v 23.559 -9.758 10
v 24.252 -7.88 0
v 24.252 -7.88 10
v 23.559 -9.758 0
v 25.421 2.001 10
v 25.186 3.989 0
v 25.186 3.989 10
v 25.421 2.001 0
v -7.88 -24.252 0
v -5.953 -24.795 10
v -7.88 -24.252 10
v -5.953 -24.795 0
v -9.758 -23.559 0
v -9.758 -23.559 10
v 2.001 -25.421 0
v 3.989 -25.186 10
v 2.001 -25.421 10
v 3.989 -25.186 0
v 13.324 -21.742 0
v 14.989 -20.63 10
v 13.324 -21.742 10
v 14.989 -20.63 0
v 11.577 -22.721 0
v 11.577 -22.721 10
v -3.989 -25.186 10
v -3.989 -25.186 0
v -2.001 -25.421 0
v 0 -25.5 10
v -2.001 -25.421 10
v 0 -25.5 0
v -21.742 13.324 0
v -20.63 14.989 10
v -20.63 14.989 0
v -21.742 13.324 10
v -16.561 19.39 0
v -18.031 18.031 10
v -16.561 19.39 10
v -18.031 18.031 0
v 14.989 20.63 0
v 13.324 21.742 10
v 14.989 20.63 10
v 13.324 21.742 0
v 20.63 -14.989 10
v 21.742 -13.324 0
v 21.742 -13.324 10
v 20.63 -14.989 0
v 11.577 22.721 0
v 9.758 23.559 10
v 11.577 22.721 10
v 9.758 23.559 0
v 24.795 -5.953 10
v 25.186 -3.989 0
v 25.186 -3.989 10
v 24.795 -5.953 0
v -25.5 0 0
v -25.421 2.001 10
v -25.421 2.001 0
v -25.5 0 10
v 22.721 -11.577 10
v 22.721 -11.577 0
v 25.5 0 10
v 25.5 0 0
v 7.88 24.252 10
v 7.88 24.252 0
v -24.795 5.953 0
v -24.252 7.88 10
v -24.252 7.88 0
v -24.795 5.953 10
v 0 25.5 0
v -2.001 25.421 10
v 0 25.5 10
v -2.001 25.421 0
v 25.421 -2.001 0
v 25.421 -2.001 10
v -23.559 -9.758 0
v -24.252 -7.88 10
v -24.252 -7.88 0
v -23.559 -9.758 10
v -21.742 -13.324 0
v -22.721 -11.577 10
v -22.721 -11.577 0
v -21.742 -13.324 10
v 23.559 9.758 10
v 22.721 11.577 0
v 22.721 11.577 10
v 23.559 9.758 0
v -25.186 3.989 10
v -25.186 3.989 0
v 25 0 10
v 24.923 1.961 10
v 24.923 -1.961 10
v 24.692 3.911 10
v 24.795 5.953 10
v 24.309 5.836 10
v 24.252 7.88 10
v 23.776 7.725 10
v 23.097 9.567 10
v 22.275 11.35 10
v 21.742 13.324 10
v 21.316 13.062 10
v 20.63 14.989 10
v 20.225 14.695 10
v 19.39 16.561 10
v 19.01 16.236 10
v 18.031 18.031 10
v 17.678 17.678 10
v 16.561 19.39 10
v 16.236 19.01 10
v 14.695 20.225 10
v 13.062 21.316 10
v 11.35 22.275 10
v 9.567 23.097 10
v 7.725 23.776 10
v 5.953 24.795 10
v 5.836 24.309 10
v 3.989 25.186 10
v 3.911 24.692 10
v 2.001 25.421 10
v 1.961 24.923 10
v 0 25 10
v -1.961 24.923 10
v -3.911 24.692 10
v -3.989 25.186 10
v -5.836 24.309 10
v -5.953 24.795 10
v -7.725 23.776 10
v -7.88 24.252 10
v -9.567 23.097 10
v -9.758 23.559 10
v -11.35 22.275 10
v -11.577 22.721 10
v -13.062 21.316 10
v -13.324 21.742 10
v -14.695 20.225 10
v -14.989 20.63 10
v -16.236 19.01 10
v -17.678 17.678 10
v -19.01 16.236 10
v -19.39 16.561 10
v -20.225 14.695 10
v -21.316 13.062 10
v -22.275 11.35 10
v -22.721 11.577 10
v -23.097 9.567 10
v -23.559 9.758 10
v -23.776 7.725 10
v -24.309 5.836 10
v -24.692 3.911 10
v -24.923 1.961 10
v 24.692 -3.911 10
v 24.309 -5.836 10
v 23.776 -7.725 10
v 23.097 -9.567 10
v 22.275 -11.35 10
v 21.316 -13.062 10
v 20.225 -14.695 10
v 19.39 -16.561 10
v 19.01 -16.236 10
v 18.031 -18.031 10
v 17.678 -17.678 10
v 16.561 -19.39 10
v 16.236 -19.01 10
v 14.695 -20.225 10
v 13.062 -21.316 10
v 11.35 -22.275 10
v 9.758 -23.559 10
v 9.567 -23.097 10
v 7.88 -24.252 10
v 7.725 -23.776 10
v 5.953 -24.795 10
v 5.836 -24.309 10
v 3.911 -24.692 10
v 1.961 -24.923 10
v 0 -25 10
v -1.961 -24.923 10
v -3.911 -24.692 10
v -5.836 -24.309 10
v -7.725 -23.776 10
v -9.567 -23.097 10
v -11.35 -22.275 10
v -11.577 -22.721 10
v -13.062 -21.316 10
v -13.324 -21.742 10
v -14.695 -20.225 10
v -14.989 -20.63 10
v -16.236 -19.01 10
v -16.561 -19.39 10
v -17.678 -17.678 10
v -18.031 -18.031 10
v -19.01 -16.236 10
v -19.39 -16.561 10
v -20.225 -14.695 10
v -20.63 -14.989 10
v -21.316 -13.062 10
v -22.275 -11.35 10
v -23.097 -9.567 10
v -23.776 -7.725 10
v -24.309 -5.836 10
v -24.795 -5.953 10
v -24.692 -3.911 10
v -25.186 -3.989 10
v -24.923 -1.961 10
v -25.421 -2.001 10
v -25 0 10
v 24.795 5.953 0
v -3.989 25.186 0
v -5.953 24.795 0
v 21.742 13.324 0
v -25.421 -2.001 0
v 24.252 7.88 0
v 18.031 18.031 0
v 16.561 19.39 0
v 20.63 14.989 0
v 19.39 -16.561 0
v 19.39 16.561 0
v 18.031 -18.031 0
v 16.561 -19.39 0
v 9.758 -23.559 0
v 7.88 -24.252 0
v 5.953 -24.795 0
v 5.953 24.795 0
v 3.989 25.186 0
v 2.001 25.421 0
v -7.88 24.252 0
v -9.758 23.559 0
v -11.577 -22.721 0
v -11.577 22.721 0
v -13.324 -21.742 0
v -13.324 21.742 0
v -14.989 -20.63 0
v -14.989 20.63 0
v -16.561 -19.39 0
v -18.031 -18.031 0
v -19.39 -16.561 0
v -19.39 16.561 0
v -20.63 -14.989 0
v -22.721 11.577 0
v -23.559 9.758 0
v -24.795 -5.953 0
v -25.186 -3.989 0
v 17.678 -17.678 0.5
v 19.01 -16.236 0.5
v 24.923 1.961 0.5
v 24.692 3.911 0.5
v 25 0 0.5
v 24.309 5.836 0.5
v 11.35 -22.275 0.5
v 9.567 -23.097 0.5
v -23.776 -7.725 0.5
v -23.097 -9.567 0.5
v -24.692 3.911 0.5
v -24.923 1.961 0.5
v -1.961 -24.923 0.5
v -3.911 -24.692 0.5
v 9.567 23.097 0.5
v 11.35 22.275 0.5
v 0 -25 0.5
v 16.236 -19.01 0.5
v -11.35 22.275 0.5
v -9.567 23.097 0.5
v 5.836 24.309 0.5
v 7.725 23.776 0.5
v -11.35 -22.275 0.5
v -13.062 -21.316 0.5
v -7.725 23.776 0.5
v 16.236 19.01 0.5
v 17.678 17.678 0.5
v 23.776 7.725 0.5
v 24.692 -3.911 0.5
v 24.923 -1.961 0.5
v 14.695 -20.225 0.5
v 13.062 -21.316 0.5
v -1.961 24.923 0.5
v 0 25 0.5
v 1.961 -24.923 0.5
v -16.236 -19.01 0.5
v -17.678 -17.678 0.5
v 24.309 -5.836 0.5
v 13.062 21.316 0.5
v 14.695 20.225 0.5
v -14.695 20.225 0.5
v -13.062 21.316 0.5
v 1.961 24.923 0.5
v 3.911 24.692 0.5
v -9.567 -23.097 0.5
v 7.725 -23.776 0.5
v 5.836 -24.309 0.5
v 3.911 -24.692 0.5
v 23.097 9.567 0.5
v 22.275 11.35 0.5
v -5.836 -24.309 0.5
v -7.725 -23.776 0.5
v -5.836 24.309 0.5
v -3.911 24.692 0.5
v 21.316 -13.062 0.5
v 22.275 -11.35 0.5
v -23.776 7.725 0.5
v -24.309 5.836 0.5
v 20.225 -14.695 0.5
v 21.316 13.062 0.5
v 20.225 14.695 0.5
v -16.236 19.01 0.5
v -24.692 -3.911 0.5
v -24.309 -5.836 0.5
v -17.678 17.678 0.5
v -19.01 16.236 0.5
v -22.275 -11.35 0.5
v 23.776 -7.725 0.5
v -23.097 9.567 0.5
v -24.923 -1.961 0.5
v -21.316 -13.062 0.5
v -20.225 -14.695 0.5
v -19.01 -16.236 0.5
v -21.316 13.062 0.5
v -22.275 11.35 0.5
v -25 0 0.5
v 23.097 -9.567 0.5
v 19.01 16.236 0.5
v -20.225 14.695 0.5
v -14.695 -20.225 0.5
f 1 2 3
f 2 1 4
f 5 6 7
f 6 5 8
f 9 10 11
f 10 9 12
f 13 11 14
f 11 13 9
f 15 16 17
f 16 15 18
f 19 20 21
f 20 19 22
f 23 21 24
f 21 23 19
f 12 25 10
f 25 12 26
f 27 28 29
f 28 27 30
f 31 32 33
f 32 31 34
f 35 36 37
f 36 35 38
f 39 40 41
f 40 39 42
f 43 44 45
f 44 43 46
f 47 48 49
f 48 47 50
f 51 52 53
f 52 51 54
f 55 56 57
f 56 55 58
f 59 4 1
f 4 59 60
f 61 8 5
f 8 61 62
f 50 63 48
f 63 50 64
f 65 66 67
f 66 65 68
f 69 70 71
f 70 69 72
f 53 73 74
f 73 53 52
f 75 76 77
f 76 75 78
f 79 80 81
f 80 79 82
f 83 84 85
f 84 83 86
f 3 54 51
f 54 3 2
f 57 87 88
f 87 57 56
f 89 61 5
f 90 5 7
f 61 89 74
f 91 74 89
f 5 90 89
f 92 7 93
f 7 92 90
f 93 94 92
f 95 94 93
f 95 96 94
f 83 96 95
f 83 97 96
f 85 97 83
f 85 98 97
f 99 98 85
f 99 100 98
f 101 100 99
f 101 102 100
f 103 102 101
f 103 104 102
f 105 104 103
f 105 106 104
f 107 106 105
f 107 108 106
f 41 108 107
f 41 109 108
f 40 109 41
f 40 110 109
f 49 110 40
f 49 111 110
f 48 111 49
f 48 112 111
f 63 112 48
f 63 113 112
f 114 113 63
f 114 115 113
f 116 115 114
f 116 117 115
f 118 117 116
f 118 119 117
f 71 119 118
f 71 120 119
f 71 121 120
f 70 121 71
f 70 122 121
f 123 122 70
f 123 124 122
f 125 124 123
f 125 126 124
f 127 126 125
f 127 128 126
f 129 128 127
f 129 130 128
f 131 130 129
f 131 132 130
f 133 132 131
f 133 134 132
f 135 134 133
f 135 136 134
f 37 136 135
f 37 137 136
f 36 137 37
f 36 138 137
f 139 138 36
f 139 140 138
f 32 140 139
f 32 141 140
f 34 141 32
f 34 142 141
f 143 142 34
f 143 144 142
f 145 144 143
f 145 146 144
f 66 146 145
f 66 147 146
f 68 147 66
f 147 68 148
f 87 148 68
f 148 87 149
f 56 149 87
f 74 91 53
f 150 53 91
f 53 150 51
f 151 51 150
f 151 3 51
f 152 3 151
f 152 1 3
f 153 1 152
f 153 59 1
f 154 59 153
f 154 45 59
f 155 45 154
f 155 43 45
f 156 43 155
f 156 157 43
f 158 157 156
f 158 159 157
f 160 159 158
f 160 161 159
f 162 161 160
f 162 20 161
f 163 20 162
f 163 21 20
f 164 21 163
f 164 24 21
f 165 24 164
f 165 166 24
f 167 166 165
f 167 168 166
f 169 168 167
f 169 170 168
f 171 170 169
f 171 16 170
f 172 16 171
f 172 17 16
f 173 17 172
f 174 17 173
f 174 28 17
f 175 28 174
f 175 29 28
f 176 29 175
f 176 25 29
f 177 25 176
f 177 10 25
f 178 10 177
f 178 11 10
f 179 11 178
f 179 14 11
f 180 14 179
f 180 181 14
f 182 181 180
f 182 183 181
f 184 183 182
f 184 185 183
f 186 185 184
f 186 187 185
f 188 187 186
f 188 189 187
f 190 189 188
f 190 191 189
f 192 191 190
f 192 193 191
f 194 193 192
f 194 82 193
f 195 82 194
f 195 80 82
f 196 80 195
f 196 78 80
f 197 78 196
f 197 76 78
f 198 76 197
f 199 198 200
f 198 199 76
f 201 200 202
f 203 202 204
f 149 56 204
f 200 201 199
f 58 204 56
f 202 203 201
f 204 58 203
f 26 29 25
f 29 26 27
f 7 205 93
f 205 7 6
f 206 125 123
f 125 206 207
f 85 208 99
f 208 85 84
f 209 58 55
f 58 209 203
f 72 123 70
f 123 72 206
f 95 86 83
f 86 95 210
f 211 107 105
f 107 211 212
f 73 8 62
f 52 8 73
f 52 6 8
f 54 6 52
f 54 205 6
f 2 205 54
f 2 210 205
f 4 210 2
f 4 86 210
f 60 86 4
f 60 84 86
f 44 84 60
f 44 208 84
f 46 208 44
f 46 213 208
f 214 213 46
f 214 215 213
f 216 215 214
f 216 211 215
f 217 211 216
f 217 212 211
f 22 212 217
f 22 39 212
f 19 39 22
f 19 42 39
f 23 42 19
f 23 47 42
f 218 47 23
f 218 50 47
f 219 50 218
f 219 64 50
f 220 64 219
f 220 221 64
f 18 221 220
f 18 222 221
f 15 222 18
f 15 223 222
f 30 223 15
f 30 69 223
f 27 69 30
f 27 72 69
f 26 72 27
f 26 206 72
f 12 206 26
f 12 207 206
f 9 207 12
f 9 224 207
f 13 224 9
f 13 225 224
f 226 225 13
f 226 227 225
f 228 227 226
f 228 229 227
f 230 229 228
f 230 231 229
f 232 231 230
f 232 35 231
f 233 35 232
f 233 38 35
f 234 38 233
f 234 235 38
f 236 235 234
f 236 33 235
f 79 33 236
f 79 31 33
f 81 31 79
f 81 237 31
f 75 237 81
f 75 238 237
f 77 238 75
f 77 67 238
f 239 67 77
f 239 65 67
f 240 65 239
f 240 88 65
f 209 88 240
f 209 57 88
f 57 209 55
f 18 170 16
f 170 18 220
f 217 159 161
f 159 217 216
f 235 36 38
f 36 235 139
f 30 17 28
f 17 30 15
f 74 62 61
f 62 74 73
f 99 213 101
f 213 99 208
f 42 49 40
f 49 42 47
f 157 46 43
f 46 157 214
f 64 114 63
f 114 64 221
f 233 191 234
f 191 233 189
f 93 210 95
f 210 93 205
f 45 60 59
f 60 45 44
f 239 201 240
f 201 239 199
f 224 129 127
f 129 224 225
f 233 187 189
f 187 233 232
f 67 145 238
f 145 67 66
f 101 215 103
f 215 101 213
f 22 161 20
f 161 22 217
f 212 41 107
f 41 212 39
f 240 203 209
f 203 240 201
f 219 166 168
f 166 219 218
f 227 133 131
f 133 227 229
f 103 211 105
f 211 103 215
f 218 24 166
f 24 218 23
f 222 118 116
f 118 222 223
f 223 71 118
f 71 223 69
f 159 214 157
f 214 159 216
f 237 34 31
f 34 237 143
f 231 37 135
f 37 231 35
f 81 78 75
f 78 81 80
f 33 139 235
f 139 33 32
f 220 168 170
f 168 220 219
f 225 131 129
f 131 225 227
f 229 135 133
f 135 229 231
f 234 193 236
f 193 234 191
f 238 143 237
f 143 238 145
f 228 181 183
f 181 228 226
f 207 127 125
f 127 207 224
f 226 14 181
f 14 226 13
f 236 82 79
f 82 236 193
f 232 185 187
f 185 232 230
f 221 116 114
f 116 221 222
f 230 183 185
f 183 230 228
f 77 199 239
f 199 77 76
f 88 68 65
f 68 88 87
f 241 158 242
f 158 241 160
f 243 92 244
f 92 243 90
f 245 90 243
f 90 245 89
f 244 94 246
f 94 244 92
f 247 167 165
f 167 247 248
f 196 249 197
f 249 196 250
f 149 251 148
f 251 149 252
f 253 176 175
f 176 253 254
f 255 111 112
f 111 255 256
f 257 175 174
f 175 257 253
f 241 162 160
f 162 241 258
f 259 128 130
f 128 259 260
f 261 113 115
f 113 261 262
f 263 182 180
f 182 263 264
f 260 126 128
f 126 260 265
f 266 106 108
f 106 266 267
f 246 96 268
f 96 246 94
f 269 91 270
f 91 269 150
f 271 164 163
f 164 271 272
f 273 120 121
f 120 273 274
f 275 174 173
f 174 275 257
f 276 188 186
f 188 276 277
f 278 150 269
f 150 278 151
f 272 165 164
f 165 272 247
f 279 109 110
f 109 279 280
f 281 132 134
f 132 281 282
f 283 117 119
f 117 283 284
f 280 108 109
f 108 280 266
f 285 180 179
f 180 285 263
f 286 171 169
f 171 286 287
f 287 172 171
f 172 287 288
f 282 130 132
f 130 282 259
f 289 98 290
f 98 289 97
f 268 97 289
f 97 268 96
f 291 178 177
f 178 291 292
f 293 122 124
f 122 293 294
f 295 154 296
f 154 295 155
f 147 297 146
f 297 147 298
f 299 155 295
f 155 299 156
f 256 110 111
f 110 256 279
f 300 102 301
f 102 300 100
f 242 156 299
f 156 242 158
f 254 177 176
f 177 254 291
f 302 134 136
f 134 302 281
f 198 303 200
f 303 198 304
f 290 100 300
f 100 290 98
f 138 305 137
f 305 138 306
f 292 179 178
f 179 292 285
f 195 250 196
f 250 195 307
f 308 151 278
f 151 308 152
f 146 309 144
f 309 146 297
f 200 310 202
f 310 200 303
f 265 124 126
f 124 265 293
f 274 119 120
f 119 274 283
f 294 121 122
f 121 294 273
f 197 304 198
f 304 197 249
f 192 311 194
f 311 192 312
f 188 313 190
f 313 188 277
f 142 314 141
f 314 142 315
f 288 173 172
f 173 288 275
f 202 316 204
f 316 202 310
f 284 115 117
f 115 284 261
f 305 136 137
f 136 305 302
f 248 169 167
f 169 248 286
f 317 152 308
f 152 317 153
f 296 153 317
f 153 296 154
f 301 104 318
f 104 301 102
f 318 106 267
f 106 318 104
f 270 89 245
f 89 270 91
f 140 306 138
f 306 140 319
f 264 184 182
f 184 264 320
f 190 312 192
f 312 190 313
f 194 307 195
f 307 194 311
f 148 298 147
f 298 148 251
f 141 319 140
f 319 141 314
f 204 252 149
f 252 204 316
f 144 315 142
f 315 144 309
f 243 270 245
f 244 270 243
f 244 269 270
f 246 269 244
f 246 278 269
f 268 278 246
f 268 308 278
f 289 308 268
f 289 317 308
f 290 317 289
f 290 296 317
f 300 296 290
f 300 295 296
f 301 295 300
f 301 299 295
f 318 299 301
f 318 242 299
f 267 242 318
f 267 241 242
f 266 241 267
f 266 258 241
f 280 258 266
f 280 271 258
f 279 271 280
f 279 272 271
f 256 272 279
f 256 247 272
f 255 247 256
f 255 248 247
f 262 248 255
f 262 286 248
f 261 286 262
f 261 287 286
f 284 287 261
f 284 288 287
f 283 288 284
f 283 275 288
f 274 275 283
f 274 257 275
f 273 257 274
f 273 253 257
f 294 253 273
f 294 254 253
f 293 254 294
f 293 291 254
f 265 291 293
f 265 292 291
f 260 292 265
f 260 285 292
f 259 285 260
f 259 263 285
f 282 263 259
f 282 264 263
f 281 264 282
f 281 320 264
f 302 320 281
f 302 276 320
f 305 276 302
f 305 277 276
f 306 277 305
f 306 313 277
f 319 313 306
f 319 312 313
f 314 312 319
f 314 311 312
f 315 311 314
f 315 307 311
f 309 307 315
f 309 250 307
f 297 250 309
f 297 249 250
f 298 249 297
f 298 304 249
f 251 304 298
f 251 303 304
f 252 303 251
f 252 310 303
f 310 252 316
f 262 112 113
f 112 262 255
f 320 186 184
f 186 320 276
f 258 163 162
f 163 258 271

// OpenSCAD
//!OpenSCAD
// Customizable tube cap

// Resolution
$fn = 80;
cap_inside_diameter = 50;
wall_thickness = 0.5;
floor_thickness = 0.5;
cap_height = 10;

difference() {
    cylinder(r = cap_inside_diameter  / 2 + wall_thickness, h = cap_height);
    translate([0, 0, floor_thickness])
        cylinder(r = cap_inside_diameter / 2, h = cap_height);
}
